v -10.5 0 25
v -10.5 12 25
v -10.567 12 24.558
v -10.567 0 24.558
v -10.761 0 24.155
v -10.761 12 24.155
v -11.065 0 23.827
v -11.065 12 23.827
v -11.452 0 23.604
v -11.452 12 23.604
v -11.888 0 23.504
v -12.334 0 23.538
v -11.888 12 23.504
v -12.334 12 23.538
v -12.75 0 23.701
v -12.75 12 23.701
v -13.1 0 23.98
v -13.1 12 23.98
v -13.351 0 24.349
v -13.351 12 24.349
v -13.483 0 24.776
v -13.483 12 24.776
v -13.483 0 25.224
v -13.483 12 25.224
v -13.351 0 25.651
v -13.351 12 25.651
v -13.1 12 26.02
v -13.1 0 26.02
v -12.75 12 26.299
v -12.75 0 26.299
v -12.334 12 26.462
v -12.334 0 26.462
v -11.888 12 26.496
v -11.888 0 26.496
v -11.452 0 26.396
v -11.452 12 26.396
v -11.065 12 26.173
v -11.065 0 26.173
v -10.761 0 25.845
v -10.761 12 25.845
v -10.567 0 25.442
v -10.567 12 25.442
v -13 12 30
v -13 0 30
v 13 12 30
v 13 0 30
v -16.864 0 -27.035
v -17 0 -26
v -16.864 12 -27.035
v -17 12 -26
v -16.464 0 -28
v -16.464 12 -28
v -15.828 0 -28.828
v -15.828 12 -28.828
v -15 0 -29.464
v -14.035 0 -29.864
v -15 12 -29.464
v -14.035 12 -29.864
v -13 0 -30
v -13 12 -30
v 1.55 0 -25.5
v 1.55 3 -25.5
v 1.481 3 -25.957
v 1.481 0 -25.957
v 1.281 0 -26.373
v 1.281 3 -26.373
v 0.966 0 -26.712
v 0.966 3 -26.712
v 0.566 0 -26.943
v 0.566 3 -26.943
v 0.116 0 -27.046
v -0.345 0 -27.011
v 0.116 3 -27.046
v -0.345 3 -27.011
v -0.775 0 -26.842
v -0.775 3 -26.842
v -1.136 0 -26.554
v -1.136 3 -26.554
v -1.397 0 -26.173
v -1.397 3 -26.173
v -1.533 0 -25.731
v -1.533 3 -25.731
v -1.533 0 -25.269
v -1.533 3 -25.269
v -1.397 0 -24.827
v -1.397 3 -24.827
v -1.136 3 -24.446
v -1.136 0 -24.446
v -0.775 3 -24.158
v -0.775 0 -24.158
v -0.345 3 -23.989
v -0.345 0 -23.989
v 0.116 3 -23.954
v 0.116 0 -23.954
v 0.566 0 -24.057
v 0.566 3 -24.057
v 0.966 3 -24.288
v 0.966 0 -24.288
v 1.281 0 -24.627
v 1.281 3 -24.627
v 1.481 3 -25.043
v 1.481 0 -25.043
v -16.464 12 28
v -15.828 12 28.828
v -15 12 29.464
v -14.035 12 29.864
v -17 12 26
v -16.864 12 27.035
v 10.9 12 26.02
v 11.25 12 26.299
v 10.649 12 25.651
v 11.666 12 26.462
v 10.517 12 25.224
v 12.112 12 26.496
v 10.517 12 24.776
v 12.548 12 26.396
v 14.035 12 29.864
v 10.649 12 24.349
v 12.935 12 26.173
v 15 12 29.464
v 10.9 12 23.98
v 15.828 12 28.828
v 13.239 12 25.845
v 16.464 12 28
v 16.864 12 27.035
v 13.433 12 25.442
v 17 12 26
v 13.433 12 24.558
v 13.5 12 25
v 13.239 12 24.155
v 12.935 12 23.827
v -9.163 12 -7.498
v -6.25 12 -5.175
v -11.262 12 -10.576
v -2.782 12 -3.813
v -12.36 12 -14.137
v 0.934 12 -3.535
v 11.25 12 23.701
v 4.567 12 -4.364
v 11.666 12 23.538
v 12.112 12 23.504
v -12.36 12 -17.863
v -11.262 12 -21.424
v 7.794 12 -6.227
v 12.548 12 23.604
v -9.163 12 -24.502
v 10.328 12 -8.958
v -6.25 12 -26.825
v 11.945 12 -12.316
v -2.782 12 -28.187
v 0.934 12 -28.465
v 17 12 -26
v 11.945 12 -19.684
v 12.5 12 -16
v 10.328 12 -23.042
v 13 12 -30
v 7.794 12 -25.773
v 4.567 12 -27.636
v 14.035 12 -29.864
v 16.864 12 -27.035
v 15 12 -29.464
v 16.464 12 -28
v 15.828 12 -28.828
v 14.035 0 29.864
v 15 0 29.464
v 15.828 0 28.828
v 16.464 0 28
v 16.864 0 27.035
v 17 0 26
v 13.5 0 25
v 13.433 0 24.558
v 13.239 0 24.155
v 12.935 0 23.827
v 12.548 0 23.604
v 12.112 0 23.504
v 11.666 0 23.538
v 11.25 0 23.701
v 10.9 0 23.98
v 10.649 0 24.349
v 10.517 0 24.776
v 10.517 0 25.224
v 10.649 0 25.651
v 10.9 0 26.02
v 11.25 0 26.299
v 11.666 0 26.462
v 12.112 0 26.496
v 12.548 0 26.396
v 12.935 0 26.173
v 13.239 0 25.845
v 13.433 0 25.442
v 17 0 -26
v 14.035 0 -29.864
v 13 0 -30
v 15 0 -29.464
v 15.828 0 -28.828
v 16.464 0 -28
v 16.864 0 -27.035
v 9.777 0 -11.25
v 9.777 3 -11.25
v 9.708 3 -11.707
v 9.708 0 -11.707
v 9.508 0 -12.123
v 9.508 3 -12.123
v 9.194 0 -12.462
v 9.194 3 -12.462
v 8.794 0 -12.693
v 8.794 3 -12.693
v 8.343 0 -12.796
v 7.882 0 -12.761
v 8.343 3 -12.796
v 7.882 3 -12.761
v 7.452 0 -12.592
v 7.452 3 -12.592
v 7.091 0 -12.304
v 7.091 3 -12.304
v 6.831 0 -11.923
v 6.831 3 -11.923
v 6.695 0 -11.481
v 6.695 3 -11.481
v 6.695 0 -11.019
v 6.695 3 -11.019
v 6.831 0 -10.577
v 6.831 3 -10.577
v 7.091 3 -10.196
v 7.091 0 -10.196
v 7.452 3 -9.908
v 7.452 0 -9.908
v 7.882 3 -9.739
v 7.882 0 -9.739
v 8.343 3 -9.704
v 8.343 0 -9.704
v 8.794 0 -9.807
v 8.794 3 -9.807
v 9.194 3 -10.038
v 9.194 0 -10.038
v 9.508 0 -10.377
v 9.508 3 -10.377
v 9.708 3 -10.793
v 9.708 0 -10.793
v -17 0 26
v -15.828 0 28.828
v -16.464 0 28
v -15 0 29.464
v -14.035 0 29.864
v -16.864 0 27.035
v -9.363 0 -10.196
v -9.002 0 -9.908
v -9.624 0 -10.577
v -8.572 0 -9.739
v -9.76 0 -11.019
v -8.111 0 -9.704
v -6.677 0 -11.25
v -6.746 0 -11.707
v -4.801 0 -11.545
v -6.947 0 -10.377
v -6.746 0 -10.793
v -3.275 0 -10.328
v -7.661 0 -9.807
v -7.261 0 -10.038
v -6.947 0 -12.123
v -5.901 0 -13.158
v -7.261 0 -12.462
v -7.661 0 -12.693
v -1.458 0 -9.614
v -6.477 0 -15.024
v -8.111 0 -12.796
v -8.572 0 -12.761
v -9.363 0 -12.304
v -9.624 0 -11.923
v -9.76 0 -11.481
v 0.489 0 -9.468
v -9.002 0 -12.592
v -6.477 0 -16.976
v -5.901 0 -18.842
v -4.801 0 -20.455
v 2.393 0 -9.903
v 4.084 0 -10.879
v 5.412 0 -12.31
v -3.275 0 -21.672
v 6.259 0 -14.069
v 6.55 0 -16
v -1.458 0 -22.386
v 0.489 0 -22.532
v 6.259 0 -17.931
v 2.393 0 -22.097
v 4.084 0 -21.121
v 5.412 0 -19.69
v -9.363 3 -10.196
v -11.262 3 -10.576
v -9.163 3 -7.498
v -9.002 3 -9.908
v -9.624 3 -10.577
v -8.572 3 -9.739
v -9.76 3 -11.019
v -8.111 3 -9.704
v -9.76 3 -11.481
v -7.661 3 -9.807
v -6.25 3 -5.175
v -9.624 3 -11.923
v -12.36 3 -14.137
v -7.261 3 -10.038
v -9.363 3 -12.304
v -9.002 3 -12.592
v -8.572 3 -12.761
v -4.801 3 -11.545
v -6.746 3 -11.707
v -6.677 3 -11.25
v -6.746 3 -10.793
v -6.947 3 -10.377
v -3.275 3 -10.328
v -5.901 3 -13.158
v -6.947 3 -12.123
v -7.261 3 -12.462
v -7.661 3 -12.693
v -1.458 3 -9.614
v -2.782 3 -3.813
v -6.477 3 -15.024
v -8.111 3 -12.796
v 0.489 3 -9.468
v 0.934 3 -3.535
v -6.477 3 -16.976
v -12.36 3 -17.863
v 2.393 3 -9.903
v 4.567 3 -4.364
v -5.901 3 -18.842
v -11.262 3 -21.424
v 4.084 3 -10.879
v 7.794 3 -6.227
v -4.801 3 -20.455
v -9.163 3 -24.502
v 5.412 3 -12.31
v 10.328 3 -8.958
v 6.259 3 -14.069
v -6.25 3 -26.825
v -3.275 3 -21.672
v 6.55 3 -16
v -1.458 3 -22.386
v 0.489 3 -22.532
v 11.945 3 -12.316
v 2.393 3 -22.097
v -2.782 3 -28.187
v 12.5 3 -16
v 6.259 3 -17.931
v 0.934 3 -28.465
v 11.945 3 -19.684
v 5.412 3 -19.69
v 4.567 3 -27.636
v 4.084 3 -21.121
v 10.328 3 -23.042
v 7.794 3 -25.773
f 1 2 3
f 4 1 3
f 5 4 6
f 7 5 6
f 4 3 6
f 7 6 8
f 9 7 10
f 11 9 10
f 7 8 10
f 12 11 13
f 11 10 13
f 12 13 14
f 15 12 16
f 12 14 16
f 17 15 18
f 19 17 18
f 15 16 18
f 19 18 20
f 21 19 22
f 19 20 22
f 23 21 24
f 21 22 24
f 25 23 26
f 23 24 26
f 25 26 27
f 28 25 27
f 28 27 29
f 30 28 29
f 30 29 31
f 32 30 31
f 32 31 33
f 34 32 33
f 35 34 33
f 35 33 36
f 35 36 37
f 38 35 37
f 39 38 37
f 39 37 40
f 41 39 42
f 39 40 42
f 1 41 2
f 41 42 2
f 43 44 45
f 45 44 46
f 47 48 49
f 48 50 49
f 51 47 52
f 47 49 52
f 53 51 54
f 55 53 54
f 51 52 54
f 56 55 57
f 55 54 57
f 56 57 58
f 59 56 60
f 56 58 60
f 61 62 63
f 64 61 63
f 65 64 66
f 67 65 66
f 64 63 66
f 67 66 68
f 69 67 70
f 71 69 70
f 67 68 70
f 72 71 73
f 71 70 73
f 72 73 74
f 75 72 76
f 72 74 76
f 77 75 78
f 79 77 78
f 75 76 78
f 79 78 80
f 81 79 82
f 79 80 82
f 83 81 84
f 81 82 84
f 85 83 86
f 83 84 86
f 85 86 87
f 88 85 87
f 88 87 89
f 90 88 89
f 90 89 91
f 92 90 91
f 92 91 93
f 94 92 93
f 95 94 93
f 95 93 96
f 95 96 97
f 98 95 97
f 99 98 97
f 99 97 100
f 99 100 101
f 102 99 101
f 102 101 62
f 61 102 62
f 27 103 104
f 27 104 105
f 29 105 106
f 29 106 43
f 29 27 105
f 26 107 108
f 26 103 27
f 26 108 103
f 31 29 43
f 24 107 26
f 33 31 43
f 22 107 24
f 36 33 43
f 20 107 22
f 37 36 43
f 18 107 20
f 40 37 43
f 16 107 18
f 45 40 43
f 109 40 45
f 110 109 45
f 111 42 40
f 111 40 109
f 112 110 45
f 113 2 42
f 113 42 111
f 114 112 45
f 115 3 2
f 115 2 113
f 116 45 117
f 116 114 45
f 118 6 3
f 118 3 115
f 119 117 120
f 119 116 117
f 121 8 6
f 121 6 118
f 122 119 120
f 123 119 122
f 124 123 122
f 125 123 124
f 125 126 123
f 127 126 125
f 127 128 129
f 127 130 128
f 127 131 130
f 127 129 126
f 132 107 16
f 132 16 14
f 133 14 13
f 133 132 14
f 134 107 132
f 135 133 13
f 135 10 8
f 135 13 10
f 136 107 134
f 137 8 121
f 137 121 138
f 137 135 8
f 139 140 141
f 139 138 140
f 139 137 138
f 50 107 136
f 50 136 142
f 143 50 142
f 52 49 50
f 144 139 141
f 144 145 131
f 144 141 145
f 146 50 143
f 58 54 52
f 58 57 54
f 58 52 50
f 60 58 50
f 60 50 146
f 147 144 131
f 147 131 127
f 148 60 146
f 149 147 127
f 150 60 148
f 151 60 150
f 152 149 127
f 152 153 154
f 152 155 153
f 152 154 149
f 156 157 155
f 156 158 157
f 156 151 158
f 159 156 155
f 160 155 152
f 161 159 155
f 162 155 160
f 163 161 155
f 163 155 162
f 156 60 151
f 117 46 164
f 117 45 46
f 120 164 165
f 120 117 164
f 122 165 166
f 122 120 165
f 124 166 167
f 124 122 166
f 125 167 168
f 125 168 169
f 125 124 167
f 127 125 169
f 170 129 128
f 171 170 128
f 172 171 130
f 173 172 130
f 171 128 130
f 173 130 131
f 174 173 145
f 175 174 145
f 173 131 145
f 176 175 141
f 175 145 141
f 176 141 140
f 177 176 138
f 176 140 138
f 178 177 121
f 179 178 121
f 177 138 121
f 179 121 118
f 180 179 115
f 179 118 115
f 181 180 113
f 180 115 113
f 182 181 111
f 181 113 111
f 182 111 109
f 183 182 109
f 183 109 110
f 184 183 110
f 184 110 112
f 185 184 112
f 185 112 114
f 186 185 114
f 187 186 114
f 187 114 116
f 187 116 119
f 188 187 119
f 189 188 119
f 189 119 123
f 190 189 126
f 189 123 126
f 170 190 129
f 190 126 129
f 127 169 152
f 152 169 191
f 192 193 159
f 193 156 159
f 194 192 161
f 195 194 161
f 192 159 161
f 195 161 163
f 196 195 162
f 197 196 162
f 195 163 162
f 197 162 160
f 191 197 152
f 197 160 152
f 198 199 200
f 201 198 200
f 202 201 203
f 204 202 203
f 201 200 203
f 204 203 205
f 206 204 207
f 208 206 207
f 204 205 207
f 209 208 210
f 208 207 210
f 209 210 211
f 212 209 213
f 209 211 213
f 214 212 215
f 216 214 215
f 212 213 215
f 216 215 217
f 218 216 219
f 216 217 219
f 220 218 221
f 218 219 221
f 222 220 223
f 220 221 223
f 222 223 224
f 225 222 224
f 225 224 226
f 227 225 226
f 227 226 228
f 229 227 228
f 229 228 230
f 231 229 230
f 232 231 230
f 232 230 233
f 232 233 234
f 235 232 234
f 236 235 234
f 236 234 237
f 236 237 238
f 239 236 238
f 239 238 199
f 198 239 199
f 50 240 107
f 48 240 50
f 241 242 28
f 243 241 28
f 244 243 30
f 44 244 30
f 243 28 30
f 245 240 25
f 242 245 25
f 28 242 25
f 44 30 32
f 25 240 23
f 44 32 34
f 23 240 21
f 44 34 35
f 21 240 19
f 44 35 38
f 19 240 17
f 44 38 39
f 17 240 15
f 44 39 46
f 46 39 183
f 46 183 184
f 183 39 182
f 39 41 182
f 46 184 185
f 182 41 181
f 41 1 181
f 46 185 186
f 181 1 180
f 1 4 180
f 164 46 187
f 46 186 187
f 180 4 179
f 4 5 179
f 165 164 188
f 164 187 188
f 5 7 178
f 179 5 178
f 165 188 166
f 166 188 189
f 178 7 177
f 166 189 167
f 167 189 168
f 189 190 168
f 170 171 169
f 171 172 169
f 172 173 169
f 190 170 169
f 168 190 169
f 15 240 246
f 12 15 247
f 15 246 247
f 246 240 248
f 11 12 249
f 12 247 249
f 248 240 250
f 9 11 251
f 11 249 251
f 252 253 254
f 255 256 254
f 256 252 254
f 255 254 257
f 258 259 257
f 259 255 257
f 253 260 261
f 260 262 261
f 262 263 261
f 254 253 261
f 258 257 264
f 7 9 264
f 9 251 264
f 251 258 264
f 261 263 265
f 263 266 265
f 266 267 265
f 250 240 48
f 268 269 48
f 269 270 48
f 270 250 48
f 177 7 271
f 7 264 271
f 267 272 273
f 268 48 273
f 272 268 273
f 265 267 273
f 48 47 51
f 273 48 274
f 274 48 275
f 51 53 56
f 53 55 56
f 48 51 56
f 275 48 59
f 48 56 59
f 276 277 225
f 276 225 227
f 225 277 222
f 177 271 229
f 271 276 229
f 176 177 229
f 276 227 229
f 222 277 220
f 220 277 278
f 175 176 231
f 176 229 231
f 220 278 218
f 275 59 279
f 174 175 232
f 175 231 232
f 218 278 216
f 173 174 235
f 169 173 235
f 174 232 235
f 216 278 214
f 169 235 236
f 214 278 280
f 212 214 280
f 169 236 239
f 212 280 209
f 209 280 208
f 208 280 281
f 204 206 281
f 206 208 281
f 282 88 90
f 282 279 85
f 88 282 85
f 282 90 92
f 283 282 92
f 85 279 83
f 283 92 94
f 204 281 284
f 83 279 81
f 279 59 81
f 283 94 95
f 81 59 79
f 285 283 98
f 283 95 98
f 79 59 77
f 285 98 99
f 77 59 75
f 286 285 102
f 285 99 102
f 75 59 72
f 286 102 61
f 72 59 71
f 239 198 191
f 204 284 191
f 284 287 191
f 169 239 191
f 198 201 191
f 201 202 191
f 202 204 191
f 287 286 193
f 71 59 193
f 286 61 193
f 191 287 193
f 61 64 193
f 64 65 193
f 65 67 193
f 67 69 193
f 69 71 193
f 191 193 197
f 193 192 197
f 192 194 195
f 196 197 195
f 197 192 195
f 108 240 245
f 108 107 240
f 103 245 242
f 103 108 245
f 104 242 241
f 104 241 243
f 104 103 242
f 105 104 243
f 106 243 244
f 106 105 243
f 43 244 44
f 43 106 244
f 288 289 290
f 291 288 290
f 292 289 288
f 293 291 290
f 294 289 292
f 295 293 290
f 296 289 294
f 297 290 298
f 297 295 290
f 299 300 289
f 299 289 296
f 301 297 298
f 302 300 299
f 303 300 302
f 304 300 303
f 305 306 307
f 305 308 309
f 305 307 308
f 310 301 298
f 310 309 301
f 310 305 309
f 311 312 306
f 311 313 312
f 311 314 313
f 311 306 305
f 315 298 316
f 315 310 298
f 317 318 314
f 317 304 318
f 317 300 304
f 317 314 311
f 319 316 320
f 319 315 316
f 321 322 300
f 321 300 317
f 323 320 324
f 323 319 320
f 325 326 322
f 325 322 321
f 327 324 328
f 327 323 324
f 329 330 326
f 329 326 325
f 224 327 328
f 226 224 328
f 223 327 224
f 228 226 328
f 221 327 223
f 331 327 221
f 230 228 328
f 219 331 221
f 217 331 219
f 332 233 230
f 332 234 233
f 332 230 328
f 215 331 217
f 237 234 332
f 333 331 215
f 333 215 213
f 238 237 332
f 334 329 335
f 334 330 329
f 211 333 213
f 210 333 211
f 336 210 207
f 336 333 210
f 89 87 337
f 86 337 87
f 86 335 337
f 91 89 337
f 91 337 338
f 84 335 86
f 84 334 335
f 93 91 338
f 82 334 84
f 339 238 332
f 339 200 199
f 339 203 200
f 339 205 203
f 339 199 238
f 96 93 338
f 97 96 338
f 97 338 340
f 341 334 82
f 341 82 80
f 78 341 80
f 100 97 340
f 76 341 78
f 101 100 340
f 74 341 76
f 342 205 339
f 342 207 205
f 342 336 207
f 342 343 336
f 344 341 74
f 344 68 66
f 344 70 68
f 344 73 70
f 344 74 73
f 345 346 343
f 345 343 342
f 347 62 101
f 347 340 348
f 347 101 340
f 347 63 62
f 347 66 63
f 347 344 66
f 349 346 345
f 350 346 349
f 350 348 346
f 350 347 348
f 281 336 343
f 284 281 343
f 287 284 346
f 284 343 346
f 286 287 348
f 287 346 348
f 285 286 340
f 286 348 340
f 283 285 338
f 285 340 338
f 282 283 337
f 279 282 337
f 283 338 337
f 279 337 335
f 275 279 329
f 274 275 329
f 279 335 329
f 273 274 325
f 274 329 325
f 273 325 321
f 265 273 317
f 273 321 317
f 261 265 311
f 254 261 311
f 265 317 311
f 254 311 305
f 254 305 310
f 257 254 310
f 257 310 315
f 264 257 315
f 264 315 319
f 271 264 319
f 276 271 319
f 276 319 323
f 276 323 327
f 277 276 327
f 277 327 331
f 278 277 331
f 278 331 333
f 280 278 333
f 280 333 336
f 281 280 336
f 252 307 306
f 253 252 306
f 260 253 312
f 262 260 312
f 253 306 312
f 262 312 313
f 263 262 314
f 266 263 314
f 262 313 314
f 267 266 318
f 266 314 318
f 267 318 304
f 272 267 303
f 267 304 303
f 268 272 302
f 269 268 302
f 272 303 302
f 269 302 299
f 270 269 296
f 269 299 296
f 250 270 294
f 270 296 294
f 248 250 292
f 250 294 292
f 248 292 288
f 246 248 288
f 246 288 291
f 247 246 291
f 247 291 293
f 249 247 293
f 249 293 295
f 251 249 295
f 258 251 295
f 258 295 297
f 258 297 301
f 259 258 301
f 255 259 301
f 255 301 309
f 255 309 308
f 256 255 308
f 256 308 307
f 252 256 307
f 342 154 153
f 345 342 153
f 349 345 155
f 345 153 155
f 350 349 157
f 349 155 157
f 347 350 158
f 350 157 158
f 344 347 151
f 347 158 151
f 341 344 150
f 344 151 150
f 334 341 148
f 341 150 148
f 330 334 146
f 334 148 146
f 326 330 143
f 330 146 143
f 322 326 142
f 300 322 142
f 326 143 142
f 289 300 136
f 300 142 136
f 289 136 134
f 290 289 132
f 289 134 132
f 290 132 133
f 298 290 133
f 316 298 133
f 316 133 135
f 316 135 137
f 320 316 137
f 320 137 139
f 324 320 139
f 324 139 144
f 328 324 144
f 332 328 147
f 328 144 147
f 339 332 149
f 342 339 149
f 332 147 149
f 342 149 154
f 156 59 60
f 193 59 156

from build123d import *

# Parameters (mm, degrees)
SKETCH_1_W             = 34
SKETCH_1_H             = 60
EXTRUDE_443_DEPTH      = 12
SKETCH_2_R             = 2.1
CUT_EXTRUDE_710_DEPTH  = 13
SKETCH_3_R             = 12.5
CUT_EXTRUDE_893_DEPTH  = 9
SKETCH_4_R             = 6.55
CUT_EXTRUDE_999_DEPTH  = 4
SKETCH_5_R             = 1.55
CUT_EXTRUDE_1168_DEPTH = 4
FILLET_4_R             = 4
SKETCH_6_R             = 2.1
SKETCH_6_R_2           = 1.5
EXTRUDE_1_DEPTH        = 12


with BuildPart() as part:
    # 草图1 → Extrude 443 (new body)
    with BuildSketch(Plane(origin=(0, 0, 0), x_dir=(1, 0, 0), z_dir=(0, 1, 0))):
        Rectangle(SKETCH_1_W, SKETCH_1_H)
    extrude(amount=EXTRUDE_443_DEPTH)

    # 草图2 → Cut-Extrude 710 (cut, through all)
    with BuildSketch(Plane(origin=(0, 12, 0), x_dir=(1, 0, 0), z_dir=(0, 1, 0))):
        with Locations((-12, -25)):
            Circle(SKETCH_2_R)
        with Locations((12, -25)):
            Circle(SKETCH_2_R)
    extrude(amount=-CUT_EXTRUDE_710_DEPTH, mode=Mode.SUBTRACT)

    # 草图3 → Cut-Extrude 893 (cut)
    with BuildSketch(Plane(origin=(0, 12, 0), x_dir=(1, 0, 0), z_dir=(0, 1, 0))):
        with Locations((0, 16)):
            Circle(SKETCH_3_R)
    extrude(amount=-CUT_EXTRUDE_893_DEPTH, mode=Mode.SUBTRACT)

    # 草图4 → Cut-Extrude 999 (cut, through all)
    with BuildSketch(Plane(origin=(0, 3, 0), x_dir=(1, 0, 0), z_dir=(0, 1, 0))):
        with Locations((0, 16)):
            Circle(SKETCH_4_R)
    extrude(amount=-CUT_EXTRUDE_999_DEPTH, mode=Mode.SUBTRACT)

    # 草图5 → Cut-Extrude 1168 (cut, through all)
    with BuildSketch(Plane(origin=(0, 3, 0), x_dir=(1, 0, 0), z_dir=(0, 1, 0))):
        with Locations((0, 25.5)):
            Circle(SKETCH_5_R)
        with Locations((8.227241336, 11.25)):
            Circle(SKETCH_5_R)
        with Locations((-8.227241336, 11.25)):
            Circle(SKETCH_5_R)
    extrude(amount=-CUT_EXTRUDE_1168_DEPTH, mode=Mode.SUBTRACT)

    # 圆角4
    fillet_4_edges = [part.edges().sort_by_distance(p)[0] for p in [
        (17, 6, 30),
        (-17, 6, 30),
        (-17, 6, -30),
        (17, 6, -30),
    ]]
    fillet(fillet_4_edges, radius=FILLET_4_R)

    # 草图6 → 凸台-拉伸1 (add)
    with BuildSketch(Plane(origin=(0, 12, 0), x_dir=(1, 0, 0), z_dir=(0, 1, 0))):
        with Locations((-12, -25)):
            Circle(SKETCH_6_R)
        with Locations((-12, -25)):
            Circle(SKETCH_6_R_2, mode=Mode.SUBTRACT)
        with Locations((12, -25)):
            Circle(SKETCH_6_R)
        with Locations((12, -25)):
            Circle(SKETCH_6_R_2, mode=Mode.SUBTRACT)
    extrude(amount=-EXTRUDE_1_DEPTH)


solid = part.part
